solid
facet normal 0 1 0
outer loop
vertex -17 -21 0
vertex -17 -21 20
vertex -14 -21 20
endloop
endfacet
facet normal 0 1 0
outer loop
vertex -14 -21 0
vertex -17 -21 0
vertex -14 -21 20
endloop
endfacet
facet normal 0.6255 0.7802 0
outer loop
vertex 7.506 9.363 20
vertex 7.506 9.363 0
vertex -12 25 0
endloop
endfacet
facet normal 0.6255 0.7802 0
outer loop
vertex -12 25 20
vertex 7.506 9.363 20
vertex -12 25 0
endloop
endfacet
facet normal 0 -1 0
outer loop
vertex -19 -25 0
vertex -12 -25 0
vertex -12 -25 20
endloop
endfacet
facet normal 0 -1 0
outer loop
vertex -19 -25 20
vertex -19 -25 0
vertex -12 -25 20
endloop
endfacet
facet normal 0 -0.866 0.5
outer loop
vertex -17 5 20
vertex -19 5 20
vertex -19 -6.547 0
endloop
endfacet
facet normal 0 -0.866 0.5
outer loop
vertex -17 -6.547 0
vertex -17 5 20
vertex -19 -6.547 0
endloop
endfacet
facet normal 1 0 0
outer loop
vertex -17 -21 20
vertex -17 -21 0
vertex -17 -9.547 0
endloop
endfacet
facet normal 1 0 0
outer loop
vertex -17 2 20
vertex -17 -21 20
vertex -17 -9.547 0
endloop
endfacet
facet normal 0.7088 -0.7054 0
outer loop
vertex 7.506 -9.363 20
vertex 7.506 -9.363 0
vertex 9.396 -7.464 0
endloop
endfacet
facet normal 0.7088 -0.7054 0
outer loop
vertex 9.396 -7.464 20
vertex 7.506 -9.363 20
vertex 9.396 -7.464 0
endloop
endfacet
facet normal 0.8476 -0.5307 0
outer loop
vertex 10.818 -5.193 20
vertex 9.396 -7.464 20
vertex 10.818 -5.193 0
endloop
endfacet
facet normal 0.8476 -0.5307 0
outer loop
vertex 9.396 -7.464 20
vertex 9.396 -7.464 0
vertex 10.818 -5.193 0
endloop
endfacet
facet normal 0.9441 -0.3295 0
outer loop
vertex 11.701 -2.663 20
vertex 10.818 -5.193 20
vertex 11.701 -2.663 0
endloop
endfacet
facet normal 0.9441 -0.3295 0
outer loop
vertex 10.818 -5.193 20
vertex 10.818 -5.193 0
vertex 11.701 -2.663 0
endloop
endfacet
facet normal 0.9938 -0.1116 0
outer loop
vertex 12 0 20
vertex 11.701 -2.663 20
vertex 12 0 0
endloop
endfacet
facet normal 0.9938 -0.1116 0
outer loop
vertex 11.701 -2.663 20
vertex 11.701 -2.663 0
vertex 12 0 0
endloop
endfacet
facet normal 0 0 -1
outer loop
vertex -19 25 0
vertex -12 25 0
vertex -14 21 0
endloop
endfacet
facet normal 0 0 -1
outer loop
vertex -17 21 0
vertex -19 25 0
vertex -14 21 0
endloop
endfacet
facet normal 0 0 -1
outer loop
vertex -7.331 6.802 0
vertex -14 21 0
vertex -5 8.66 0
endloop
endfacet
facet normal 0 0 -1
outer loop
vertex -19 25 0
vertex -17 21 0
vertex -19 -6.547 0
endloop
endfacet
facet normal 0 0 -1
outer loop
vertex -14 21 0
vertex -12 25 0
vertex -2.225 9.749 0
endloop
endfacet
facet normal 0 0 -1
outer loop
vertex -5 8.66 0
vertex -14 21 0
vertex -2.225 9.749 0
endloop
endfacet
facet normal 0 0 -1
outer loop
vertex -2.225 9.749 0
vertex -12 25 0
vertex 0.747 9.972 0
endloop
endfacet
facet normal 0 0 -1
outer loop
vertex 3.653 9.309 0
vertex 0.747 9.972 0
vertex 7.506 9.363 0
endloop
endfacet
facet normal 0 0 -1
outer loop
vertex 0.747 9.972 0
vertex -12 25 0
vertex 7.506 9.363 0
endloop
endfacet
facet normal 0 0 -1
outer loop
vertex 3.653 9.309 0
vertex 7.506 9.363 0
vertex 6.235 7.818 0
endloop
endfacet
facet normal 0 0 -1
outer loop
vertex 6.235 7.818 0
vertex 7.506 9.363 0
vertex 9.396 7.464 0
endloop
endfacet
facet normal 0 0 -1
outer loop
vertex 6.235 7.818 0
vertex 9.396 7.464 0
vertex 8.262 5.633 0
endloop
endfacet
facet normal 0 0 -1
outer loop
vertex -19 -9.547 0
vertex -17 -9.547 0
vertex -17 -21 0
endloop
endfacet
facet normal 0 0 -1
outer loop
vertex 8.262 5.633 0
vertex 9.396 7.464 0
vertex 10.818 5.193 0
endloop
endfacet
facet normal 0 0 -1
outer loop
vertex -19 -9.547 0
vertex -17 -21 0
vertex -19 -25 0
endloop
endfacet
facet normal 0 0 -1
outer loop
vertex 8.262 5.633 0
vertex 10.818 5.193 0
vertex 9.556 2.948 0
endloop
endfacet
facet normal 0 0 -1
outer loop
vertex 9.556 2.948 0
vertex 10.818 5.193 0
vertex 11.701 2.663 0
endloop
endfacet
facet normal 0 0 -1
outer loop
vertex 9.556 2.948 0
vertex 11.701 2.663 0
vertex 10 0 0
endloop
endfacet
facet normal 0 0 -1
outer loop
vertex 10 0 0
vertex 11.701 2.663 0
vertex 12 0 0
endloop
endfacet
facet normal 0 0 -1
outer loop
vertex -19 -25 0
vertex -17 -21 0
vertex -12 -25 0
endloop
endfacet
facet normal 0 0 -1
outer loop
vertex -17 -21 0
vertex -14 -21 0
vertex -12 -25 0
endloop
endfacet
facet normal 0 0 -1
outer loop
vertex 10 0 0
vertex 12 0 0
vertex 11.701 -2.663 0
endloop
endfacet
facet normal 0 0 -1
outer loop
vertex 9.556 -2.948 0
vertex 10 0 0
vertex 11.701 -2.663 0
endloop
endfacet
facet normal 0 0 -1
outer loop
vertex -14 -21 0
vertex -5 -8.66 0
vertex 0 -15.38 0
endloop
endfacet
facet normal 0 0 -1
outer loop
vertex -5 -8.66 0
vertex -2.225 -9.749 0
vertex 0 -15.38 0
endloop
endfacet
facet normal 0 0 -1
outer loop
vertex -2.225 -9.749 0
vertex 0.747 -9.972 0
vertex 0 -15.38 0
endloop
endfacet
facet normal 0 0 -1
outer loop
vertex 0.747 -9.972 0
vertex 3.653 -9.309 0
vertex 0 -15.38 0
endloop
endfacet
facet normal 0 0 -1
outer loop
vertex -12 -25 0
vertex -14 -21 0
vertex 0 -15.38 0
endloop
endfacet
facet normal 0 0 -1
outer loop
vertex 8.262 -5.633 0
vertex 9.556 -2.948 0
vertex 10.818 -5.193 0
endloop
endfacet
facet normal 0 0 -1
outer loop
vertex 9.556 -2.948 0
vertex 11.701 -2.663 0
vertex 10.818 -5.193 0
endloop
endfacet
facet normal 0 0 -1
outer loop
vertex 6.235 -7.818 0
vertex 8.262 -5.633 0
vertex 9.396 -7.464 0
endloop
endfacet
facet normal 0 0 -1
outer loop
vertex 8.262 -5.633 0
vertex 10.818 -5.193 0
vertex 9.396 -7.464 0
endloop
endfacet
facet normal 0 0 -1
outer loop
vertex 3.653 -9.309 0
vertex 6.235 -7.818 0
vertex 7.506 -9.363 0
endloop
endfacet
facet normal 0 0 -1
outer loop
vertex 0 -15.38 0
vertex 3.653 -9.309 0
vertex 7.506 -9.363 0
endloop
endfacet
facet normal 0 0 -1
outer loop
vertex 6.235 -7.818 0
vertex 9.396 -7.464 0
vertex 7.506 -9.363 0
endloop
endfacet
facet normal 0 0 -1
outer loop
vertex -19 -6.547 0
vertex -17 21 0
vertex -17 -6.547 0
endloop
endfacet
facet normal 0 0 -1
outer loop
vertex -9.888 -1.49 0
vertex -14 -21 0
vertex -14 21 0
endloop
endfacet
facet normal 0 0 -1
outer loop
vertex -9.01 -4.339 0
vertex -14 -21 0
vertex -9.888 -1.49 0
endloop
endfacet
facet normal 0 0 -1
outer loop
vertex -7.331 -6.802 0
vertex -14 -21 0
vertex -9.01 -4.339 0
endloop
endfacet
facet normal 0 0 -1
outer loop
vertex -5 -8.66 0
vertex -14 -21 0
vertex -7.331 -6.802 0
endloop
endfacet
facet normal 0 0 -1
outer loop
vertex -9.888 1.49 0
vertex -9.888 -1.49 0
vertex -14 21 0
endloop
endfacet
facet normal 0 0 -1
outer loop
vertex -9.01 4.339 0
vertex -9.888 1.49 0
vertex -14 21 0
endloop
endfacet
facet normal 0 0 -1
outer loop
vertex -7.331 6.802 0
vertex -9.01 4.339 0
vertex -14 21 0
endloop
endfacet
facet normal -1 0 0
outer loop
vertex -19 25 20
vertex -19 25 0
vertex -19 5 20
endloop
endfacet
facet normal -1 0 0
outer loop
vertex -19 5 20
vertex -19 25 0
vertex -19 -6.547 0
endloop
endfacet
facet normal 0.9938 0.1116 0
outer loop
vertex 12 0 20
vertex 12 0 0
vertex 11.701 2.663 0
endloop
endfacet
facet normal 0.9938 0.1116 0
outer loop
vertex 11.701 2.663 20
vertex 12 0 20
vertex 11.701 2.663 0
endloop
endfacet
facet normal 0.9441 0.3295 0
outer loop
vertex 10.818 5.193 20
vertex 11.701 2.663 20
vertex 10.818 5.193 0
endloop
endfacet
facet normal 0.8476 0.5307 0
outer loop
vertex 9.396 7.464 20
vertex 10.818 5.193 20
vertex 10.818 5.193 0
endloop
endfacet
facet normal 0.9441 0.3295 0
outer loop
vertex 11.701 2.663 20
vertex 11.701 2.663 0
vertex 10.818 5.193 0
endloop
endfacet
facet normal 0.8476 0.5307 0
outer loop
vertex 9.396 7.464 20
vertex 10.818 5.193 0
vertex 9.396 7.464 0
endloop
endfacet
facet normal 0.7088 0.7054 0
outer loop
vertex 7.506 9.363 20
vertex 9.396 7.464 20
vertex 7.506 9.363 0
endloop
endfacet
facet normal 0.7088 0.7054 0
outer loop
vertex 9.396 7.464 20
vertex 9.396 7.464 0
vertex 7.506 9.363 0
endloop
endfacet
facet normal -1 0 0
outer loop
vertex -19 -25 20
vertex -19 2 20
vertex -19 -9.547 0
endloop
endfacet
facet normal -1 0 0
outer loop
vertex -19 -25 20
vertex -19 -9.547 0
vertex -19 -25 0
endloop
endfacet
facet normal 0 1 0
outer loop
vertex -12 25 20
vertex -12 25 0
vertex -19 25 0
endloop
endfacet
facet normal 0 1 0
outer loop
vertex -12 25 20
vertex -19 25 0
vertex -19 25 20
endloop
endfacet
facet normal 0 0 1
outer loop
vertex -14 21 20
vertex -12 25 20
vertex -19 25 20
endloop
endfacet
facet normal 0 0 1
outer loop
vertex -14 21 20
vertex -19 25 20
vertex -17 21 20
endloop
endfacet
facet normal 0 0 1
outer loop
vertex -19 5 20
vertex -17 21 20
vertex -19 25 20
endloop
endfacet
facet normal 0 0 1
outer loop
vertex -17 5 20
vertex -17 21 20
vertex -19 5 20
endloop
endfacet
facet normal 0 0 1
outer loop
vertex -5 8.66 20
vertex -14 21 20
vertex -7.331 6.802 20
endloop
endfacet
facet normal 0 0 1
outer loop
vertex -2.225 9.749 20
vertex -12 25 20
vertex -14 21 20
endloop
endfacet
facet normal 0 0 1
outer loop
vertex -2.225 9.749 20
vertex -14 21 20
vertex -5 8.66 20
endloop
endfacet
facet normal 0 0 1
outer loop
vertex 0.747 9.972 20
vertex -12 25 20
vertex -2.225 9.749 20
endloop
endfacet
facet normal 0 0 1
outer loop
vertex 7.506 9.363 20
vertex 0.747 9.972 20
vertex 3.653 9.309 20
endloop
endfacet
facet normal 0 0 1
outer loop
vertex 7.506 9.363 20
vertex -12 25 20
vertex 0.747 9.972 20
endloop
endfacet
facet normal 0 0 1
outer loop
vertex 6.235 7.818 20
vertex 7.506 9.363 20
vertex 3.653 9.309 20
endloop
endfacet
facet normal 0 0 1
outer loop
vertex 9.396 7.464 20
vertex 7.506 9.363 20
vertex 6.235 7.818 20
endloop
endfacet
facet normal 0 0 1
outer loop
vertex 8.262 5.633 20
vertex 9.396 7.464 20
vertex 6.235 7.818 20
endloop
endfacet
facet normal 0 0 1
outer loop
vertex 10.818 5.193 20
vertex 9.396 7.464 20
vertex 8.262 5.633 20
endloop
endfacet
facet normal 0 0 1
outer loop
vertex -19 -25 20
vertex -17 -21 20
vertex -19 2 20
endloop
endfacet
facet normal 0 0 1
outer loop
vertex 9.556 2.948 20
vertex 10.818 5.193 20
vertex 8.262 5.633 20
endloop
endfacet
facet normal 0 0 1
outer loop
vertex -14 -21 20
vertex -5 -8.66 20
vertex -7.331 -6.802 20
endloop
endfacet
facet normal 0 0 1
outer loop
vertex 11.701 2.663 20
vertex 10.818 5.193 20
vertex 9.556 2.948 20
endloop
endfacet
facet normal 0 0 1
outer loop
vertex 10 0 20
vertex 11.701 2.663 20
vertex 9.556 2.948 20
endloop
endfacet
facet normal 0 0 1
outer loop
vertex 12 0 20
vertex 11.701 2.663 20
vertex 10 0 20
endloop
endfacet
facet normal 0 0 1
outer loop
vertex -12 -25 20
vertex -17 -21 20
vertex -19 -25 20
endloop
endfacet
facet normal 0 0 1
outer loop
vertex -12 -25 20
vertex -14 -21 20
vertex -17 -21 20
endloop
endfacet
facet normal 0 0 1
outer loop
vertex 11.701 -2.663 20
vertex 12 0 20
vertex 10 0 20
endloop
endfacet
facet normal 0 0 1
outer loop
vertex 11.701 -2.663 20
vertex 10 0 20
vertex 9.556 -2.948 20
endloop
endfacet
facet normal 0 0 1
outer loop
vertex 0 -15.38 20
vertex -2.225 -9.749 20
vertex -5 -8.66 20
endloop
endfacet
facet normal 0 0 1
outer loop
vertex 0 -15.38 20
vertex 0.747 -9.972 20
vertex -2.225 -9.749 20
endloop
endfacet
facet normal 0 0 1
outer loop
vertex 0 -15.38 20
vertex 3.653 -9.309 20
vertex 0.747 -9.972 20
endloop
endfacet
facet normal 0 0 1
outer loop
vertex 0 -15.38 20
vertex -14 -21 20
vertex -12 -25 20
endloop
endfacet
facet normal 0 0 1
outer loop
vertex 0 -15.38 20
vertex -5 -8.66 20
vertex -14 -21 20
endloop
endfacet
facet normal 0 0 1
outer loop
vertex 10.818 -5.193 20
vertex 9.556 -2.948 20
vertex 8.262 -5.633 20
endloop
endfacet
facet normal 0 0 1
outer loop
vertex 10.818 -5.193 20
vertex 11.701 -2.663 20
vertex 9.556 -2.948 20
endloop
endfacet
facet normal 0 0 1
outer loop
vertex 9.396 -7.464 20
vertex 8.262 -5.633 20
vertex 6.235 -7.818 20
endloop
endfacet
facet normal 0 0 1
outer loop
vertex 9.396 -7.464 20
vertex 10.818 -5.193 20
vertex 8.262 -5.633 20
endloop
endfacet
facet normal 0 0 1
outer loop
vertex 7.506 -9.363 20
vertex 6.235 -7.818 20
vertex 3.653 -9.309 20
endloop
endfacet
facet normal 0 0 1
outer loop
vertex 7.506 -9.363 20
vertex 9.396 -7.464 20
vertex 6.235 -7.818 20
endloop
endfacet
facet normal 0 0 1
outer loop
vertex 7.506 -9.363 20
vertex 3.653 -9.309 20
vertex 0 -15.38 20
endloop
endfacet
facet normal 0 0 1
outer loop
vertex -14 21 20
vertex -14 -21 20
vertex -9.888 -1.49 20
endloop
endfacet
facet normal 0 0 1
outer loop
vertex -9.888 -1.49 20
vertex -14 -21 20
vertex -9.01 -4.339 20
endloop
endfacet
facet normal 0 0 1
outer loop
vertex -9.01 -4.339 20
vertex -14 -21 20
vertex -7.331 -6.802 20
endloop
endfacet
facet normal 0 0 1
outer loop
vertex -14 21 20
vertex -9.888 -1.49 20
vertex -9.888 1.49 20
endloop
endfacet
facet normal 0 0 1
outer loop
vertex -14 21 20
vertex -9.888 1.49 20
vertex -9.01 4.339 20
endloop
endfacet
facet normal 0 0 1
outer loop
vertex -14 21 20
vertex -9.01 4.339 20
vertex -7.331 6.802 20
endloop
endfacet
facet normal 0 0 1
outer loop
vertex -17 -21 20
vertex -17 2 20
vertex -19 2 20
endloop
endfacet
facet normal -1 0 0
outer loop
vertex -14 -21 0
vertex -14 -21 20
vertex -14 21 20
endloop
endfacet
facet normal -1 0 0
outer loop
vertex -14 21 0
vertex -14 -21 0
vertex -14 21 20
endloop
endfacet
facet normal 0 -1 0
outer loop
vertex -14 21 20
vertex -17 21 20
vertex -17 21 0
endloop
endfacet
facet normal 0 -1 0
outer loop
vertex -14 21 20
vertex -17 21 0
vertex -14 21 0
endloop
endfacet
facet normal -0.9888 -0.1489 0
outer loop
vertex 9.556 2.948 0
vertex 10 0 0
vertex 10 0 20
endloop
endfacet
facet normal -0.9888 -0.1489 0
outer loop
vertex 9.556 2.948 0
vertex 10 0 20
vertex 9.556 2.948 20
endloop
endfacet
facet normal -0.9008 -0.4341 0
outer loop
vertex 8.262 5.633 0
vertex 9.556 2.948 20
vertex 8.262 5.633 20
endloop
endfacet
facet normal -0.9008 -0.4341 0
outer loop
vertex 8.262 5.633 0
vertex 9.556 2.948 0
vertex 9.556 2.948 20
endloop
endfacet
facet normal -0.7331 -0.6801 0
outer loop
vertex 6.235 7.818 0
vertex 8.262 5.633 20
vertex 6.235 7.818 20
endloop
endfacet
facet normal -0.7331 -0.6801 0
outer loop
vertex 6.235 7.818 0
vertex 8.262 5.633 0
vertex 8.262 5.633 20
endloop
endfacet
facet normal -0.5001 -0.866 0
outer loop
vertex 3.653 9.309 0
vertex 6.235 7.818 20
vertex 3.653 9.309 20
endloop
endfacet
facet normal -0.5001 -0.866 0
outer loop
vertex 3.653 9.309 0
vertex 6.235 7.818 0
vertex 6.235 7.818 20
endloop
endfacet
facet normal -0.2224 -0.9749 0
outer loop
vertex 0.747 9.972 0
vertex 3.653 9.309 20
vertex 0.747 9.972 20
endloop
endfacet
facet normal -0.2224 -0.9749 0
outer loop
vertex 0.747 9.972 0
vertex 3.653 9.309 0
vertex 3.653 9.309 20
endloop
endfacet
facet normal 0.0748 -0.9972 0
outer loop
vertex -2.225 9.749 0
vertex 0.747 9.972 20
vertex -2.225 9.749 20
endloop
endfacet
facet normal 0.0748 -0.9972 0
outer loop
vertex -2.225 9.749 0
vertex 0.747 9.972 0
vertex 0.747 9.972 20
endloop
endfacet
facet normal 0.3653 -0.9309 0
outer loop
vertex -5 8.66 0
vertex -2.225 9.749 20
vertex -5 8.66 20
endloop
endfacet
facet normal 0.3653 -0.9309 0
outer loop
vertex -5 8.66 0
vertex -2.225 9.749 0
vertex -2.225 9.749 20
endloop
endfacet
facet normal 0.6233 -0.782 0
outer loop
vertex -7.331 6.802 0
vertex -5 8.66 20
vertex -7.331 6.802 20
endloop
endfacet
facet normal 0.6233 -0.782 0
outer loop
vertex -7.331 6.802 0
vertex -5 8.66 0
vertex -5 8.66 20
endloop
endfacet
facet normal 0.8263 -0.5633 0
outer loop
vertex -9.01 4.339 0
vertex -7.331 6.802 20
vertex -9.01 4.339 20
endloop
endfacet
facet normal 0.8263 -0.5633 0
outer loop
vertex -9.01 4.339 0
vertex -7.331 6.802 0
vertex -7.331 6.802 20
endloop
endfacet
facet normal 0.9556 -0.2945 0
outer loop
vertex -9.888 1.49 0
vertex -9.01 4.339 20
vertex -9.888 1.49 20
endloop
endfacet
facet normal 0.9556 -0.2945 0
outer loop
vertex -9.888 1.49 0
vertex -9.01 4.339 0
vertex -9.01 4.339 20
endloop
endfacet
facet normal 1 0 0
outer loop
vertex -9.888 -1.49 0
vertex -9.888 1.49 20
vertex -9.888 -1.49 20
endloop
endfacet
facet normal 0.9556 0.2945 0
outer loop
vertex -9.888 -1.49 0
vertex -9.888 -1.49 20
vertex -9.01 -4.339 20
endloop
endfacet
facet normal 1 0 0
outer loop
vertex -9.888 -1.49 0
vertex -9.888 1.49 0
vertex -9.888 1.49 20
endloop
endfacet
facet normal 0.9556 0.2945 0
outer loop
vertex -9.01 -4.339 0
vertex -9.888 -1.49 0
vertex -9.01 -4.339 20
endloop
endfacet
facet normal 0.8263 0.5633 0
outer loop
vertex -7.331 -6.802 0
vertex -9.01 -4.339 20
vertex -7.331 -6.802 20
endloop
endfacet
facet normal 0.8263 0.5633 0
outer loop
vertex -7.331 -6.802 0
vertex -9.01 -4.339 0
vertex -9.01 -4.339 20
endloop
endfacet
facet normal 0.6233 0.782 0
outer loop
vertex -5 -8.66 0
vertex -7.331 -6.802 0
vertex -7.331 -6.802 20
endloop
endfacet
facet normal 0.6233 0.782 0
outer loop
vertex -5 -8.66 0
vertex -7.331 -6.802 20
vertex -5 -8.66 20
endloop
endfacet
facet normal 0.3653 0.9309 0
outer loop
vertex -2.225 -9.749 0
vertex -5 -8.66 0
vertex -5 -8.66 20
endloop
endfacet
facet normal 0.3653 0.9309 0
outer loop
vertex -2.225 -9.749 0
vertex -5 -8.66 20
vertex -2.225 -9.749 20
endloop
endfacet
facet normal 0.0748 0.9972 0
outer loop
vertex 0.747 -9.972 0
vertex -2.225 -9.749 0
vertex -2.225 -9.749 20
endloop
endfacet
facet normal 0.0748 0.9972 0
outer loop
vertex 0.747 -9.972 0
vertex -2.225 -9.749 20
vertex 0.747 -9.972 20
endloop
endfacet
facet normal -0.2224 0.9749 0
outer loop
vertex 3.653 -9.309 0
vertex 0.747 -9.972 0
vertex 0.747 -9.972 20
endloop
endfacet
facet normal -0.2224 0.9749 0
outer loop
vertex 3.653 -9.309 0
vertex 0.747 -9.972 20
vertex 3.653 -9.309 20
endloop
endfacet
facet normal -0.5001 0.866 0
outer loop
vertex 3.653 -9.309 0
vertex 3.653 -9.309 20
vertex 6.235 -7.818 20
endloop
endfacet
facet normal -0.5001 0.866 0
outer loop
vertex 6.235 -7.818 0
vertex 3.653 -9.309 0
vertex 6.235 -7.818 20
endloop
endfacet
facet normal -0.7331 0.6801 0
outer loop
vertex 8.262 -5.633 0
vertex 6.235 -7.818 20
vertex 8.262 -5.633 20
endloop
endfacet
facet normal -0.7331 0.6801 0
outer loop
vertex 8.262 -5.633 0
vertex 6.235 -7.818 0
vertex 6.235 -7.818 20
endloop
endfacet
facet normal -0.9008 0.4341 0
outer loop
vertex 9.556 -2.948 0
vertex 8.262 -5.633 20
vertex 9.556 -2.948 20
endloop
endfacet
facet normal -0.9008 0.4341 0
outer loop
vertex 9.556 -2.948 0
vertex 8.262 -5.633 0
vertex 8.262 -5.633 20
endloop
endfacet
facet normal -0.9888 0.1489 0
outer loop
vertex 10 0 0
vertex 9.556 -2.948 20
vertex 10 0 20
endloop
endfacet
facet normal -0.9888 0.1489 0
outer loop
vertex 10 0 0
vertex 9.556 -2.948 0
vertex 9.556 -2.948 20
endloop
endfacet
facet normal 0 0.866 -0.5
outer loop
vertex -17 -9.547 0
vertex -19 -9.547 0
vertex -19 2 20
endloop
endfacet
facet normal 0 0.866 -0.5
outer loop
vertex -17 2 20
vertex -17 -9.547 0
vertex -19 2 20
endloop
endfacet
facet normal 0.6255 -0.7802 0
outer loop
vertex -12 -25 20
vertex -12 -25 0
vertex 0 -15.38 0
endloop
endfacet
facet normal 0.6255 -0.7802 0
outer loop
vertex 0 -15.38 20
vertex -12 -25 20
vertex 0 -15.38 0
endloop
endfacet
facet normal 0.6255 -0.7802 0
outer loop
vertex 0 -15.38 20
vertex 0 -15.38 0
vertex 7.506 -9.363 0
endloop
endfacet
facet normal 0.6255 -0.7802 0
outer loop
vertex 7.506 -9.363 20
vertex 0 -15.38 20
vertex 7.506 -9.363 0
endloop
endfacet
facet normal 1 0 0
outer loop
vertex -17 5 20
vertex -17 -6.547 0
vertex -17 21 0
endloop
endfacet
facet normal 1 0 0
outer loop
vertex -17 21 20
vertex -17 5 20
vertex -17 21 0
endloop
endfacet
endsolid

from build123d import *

# Parameters (mm, degrees)
F0_R     = 10
F1_DEPTH = 20
F2_DEPTH = 7
F3_W     = 3
F3_H     = 42
F4_DEPTH = 20.001
F6_DEPTH = 2


with BuildPart() as f1:
    # F0 (on Top) → F1 (new body)
    with BuildSketch(Plane.XY):
        with BuildLine():
            ThreePointArc((-12, 0), (-5.192772811, 10.8182766896), (7.5058517555, 9.3628088427))
            Line((7.5058517555, 9.3628088427), (-12, 25))
            Line((-12, 25), (-12, 0))
        make_face()
        with BuildLine():
            ThreePointArc((7.5058517555, -9.3628088427), (10.8182766896, -5.192772811), (12, 0))
            ThreePointArc((12, 0), (10.8182766896, 5.192772811), (7.5058517555, 9.3628088427))
            ThreePointArc((7.5058517555, 9.3628088427), (-5.192772811, 10.8182766896), (-12, 0))
            ThreePointArc((-12, 0), (-5.192772811, -10.8182766896), (7.5058517555, -9.3628088427))
        make_face()
        Circle(F0_R, mode=Mode.SUBTRACT)
        with BuildLine():
            Line((0, -15.38), (7.5058517555, -9.3628088427))
            ThreePointArc((7.5058517555, -9.3628088427), (-5.192772811, -10.8182766896), (-12, 0))
            Line((-12, 0), (-12, -25))
            Line((-12, -25), (0, -15.38))
        make_face()
    extrude(amount=F1_DEPTH)

    # F2 (add): a face of the model
    f2_faces = [f1.faces().sort_by_distance(p)[0] for p in [
        (-12, 0, 10),
    ]]
    extrude(f2_faces, amount=F2_DEPTH)

    # F3 (on face) → F4 (cut, through all)
    with BuildSketch(Plane.XY.offset(20)):
        with Locations((-15.5, 0)):
            Rectangle(F3_W, F3_H)
    extrude(amount=-F4_DEPTH, mode=Mode.SUBTRACT)

    # F5 (on face) → F6 (cut, through all)
    with BuildSketch(Plane(origin=(-19, 0, 0), x_dir=(0, -1, 0), z_dir=(-1, 0, 0))):
        Polygon((6.5470053838, 0), (9.5470053838, 0), (-2, 20), (-5, 20), align=None)
    extrude(amount=-F6_DEPTH, mode=Mode.SUBTRACT)


solid = f1.part
